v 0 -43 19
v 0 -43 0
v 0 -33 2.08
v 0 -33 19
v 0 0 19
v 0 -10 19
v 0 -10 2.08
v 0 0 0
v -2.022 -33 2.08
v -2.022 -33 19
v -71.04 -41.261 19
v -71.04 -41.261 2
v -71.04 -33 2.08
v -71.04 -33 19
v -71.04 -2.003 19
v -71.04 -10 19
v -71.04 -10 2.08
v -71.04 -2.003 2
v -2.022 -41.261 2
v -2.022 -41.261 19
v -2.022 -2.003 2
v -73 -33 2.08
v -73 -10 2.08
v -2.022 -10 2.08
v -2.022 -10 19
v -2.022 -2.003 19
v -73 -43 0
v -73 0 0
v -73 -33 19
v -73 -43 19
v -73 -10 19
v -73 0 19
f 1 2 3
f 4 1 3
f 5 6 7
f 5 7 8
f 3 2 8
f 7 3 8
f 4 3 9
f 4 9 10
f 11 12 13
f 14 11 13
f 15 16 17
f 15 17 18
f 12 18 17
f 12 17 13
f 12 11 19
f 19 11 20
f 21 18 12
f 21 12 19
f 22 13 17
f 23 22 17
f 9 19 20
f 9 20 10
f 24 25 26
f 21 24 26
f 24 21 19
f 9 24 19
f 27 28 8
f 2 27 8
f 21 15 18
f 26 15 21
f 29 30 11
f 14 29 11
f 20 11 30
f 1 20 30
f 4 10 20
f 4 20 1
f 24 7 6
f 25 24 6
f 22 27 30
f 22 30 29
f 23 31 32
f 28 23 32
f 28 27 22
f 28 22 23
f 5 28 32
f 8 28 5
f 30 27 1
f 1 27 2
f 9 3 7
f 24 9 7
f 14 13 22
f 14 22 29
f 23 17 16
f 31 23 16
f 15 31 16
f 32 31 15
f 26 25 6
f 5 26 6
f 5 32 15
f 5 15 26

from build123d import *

# Parameters (mm, degrees)
SKETCH_W        = 73
SKETCH_H        = 43
PAD_DEPTH       = 19
SKETCH001_W     = 69.017719
SKETCH001_H     = 39.257344
POCKET_DEPTH    = 17
SKETCH002_W     = 23
SKETCH002_H     = 17
POCKET001_DEPTH = 80


with BuildPart() as part:
    # Sketch → Pad (new body)
    with BuildSketch(Plane.XY):
        with Locations((-36.5, -21.5)):
            Rectangle(SKETCH_W, SKETCH_H)
    extrude(amount=PAD_DEPTH)

    # Sketch001 (on Face6 of Pad) → Pocket (cut)
    with BuildSketch(Plane.XY.offset(19)):
        with Locations((-36.531126, -21.631982)):
            Rectangle(SKETCH001_W, SKETCH001_H)
    extrude(amount=-POCKET_DEPTH, mode=Mode.SUBTRACT)

    # Sketch002 (on Face3 of Pocket) → Pocket001 (cut)
    with BuildSketch(Plane.YZ):
        with Locations((-21.5, 10.579726)):
            Rectangle(SKETCH002_W, SKETCH002_H)
    extrude(amount=-POCKET001_DEPTH, mode=Mode.SUBTRACT)


solid = part.part
